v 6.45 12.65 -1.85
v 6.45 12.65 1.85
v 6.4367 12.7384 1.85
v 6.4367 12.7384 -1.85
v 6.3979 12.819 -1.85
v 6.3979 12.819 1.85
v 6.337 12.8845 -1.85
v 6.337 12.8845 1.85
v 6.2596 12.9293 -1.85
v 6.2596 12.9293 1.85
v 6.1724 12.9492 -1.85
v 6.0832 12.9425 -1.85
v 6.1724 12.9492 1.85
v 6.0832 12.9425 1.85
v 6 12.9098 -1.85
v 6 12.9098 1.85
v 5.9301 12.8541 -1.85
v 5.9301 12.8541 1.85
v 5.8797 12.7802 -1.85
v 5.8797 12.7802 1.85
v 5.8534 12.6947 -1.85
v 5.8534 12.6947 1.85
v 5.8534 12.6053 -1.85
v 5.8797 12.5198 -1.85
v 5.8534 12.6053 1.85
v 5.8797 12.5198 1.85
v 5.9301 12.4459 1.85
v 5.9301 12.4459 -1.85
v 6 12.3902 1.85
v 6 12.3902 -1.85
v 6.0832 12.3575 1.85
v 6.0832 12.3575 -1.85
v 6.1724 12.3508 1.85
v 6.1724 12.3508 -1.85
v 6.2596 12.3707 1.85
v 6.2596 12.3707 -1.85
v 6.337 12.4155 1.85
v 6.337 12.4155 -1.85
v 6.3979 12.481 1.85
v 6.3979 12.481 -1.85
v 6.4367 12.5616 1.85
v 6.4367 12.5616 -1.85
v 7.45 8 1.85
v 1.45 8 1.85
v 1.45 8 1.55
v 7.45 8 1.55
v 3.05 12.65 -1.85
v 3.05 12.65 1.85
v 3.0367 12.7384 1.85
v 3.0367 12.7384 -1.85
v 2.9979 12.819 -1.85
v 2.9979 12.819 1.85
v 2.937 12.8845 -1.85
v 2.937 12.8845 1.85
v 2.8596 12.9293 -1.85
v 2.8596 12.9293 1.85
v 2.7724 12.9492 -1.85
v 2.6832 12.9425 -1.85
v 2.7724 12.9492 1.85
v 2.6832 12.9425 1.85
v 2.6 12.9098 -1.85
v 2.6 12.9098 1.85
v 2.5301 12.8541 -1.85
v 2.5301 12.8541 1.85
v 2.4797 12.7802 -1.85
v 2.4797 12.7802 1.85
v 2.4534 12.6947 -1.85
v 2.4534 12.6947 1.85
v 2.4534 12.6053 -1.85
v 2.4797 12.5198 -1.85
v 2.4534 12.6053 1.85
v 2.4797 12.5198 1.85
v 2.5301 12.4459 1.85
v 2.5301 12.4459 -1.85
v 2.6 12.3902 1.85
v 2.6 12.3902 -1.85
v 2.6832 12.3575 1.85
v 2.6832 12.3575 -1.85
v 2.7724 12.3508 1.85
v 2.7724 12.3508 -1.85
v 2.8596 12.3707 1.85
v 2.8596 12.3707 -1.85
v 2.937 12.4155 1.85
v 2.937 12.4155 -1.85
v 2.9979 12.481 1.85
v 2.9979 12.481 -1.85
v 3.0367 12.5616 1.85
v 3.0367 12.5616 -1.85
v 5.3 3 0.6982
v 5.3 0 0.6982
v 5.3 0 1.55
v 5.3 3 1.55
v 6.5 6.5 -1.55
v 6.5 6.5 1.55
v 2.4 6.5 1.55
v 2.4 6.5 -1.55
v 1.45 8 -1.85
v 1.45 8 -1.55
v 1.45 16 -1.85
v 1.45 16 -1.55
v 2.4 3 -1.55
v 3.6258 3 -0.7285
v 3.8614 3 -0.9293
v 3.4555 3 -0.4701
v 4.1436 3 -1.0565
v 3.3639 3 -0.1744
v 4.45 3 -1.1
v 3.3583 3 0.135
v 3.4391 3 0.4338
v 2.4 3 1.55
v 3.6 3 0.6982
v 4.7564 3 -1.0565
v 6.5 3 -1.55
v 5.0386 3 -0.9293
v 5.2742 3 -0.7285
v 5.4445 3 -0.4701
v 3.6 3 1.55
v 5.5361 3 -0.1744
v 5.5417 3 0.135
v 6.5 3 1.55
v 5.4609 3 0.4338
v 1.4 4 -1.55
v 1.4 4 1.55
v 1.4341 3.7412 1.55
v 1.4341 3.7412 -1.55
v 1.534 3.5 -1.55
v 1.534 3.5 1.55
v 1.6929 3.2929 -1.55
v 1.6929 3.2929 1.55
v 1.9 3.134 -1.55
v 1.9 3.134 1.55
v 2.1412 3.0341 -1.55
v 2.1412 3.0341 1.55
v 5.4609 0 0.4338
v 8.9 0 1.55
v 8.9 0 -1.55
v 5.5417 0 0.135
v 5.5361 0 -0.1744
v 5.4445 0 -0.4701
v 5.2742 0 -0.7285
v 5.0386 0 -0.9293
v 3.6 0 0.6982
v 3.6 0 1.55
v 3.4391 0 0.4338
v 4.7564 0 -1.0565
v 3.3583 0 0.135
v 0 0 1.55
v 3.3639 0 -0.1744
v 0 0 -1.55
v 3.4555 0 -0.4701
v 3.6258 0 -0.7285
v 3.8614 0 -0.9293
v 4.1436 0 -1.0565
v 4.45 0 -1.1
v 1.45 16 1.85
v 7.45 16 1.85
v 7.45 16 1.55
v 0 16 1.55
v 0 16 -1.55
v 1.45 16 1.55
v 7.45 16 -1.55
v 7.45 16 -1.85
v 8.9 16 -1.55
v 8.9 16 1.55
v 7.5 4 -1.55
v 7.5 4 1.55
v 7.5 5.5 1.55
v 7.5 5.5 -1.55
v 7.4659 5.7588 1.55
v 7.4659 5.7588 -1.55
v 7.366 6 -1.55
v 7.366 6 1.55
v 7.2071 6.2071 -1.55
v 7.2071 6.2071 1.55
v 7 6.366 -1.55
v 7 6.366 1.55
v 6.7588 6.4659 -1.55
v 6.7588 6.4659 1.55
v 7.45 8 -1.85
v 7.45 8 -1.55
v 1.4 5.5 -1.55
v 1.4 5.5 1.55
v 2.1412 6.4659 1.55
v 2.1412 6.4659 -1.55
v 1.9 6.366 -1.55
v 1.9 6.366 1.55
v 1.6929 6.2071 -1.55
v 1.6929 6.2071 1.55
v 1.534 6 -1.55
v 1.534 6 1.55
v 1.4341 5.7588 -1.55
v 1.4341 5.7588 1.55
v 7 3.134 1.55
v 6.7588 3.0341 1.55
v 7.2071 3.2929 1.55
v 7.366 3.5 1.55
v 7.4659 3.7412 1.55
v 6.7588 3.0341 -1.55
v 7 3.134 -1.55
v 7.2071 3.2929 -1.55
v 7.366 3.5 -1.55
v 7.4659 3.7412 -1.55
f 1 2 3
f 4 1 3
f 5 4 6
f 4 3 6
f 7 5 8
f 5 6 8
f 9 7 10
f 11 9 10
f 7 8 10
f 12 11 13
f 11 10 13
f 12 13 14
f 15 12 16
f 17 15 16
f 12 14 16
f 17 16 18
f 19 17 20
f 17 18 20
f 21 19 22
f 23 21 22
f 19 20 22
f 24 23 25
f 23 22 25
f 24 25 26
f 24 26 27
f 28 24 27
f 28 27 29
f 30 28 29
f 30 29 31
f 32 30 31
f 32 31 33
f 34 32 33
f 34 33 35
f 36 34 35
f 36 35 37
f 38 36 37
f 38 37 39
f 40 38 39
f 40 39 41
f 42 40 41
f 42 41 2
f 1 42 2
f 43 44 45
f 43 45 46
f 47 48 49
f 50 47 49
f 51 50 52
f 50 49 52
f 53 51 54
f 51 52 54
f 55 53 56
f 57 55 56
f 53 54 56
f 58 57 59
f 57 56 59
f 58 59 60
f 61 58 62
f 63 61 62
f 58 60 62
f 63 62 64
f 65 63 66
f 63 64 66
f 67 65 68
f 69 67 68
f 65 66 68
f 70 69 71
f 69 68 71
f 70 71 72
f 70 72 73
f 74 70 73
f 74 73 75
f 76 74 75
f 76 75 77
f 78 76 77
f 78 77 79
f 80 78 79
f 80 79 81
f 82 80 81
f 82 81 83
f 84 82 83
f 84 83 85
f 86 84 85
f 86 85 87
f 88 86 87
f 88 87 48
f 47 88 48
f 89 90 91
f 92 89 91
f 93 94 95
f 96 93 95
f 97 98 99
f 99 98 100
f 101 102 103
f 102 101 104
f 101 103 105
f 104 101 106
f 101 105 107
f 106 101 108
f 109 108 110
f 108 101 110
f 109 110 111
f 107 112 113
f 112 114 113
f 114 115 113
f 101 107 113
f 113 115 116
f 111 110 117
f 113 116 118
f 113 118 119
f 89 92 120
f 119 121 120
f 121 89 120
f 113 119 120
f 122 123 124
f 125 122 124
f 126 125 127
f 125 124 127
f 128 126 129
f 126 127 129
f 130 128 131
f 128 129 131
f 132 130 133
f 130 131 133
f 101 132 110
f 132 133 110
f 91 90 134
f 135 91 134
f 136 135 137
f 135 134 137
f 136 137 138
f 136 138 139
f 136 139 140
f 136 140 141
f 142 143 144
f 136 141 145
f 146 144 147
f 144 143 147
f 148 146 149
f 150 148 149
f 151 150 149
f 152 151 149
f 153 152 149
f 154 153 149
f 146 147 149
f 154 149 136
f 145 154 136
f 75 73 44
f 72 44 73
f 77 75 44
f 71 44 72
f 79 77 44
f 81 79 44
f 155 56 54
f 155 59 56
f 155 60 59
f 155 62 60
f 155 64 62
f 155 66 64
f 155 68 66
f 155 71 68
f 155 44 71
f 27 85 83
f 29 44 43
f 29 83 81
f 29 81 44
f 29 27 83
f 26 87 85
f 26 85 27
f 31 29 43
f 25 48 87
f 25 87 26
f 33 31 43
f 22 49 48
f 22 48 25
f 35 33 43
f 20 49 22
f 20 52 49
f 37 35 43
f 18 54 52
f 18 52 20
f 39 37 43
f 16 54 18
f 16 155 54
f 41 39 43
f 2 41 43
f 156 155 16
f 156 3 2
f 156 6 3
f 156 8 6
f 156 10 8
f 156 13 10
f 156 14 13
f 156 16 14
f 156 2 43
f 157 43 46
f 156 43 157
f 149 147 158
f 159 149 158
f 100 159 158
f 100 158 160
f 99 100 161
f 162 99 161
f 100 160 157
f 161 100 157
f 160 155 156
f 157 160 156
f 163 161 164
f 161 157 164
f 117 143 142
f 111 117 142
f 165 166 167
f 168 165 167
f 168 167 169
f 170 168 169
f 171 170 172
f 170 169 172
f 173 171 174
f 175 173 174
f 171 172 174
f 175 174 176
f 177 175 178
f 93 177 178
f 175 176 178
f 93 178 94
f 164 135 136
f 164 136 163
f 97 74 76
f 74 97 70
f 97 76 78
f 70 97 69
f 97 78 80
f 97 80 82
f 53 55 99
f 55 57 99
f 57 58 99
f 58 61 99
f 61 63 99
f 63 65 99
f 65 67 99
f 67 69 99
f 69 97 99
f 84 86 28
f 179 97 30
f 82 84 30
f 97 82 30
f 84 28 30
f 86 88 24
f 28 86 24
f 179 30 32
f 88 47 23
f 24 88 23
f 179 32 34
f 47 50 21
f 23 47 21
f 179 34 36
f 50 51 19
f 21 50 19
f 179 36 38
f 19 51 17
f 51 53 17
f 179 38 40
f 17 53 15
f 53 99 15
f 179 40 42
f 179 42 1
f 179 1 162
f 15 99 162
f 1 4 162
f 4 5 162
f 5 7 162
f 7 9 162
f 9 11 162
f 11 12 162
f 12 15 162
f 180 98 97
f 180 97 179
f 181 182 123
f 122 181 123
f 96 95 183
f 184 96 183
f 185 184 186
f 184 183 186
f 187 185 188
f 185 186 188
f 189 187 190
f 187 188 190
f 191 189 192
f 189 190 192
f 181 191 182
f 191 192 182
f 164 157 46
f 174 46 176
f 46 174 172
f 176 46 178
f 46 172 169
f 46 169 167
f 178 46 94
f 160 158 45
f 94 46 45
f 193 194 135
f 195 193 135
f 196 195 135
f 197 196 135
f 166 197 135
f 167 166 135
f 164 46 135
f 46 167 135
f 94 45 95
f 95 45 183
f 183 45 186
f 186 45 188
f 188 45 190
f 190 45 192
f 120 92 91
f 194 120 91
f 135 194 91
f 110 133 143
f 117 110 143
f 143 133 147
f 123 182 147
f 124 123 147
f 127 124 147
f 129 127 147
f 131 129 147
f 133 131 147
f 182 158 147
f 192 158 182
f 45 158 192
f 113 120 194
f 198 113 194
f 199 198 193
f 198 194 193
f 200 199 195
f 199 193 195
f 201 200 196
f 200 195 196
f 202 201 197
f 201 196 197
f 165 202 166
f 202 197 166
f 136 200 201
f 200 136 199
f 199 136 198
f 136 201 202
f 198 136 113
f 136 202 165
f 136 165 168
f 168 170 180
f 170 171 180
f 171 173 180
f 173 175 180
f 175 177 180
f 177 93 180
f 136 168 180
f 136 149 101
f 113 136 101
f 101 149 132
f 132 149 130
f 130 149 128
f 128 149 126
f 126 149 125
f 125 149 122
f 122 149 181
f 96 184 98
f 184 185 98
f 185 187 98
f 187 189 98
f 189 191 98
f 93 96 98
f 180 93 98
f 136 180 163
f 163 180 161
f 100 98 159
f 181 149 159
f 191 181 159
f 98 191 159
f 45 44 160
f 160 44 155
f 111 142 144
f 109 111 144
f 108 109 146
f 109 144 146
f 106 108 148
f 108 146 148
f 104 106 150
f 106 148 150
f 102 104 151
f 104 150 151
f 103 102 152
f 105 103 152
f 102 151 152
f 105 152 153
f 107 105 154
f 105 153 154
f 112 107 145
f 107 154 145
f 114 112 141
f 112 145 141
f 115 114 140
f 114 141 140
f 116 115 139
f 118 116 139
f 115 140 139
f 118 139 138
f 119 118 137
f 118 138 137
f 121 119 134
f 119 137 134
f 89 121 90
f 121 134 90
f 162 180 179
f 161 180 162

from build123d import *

# Parameters (mm, degrees)
F4_DEPTH  = 8.9
F6_W      = 6
F6_H      = 8
F7_DEPTH  = 3.7
F8_R      = 0.3
F9_DEPTH  = 3.701
F11_DEPTH = 3


with BuildPart() as f4:
    # F3 (on Right) → F4 (new body)
    with BuildSketch(Plane.YZ):
        Polygon((0, 1.55), (0, 0), (0, -1.55), (16, -1.55), (16, 0), (16, 1.55), align=None)
    extrude(amount=F4_DEPTH)

    # F6 (on offset) → F7 (join)
    with BuildSketch(Plane.XY.offset(1.85)):
        with Locations((4.45, 12)):
            Rectangle(F6_W, F6_H)
    extrude(amount=-F7_DEPTH)

    # F8 (on offset) → F9 (cut, through all)
    with BuildSketch(Plane.XY.offset(1.85)):
        with BuildLine():
            ThreePointArc((1.4, 4), (1.6928932188, 3.2928932188), (2.4, 3))
            Line((2.4, 3), (6.5, 3))
            ThreePointArc((6.5, 3), (7.2071067812, 3.2928932188), (7.5, 4))
            Line((7.5, 4), (7.5, 5.5))
            ThreePointArc((7.5, 5.5), (7.2071067812, 6.2071067812), (6.5, 6.5))
            Line((6.5, 6.5), (2.4, 6.5))
            ThreePointArc((2.4, 6.5), (1.6928932188, 6.2071067812), (1.4, 5.5))
            Line((1.4, 5.5), (1.4, 4))
        make_face()
        with Locations((2.75, 12.65)):
            Circle(F8_R)
        with Locations((6.15, 12.65)):
            Circle(F8_R)
    extrude(amount=-F9_DEPTH, mode=Mode.SUBTRACT)

    # F10 (on face) → F11 (cut, through all)
    with BuildSketch(Plane.XZ):
        with BuildLine():
            Line((5.3, 1.55), (3.6, 1.55))
            Line((3.6, 1.55), (3.6, 0.6982120022))
            ThreePointArc((3.6, 0.6982120022), (4.45, -1.1), (5.3, 0.6982120022))
            Line((5.3, 0.6982120022), (5.3, 1.55))
        make_face()
    extrude(amount=-F11_DEPTH, mode=Mode.SUBTRACT)


solid = f4.part
